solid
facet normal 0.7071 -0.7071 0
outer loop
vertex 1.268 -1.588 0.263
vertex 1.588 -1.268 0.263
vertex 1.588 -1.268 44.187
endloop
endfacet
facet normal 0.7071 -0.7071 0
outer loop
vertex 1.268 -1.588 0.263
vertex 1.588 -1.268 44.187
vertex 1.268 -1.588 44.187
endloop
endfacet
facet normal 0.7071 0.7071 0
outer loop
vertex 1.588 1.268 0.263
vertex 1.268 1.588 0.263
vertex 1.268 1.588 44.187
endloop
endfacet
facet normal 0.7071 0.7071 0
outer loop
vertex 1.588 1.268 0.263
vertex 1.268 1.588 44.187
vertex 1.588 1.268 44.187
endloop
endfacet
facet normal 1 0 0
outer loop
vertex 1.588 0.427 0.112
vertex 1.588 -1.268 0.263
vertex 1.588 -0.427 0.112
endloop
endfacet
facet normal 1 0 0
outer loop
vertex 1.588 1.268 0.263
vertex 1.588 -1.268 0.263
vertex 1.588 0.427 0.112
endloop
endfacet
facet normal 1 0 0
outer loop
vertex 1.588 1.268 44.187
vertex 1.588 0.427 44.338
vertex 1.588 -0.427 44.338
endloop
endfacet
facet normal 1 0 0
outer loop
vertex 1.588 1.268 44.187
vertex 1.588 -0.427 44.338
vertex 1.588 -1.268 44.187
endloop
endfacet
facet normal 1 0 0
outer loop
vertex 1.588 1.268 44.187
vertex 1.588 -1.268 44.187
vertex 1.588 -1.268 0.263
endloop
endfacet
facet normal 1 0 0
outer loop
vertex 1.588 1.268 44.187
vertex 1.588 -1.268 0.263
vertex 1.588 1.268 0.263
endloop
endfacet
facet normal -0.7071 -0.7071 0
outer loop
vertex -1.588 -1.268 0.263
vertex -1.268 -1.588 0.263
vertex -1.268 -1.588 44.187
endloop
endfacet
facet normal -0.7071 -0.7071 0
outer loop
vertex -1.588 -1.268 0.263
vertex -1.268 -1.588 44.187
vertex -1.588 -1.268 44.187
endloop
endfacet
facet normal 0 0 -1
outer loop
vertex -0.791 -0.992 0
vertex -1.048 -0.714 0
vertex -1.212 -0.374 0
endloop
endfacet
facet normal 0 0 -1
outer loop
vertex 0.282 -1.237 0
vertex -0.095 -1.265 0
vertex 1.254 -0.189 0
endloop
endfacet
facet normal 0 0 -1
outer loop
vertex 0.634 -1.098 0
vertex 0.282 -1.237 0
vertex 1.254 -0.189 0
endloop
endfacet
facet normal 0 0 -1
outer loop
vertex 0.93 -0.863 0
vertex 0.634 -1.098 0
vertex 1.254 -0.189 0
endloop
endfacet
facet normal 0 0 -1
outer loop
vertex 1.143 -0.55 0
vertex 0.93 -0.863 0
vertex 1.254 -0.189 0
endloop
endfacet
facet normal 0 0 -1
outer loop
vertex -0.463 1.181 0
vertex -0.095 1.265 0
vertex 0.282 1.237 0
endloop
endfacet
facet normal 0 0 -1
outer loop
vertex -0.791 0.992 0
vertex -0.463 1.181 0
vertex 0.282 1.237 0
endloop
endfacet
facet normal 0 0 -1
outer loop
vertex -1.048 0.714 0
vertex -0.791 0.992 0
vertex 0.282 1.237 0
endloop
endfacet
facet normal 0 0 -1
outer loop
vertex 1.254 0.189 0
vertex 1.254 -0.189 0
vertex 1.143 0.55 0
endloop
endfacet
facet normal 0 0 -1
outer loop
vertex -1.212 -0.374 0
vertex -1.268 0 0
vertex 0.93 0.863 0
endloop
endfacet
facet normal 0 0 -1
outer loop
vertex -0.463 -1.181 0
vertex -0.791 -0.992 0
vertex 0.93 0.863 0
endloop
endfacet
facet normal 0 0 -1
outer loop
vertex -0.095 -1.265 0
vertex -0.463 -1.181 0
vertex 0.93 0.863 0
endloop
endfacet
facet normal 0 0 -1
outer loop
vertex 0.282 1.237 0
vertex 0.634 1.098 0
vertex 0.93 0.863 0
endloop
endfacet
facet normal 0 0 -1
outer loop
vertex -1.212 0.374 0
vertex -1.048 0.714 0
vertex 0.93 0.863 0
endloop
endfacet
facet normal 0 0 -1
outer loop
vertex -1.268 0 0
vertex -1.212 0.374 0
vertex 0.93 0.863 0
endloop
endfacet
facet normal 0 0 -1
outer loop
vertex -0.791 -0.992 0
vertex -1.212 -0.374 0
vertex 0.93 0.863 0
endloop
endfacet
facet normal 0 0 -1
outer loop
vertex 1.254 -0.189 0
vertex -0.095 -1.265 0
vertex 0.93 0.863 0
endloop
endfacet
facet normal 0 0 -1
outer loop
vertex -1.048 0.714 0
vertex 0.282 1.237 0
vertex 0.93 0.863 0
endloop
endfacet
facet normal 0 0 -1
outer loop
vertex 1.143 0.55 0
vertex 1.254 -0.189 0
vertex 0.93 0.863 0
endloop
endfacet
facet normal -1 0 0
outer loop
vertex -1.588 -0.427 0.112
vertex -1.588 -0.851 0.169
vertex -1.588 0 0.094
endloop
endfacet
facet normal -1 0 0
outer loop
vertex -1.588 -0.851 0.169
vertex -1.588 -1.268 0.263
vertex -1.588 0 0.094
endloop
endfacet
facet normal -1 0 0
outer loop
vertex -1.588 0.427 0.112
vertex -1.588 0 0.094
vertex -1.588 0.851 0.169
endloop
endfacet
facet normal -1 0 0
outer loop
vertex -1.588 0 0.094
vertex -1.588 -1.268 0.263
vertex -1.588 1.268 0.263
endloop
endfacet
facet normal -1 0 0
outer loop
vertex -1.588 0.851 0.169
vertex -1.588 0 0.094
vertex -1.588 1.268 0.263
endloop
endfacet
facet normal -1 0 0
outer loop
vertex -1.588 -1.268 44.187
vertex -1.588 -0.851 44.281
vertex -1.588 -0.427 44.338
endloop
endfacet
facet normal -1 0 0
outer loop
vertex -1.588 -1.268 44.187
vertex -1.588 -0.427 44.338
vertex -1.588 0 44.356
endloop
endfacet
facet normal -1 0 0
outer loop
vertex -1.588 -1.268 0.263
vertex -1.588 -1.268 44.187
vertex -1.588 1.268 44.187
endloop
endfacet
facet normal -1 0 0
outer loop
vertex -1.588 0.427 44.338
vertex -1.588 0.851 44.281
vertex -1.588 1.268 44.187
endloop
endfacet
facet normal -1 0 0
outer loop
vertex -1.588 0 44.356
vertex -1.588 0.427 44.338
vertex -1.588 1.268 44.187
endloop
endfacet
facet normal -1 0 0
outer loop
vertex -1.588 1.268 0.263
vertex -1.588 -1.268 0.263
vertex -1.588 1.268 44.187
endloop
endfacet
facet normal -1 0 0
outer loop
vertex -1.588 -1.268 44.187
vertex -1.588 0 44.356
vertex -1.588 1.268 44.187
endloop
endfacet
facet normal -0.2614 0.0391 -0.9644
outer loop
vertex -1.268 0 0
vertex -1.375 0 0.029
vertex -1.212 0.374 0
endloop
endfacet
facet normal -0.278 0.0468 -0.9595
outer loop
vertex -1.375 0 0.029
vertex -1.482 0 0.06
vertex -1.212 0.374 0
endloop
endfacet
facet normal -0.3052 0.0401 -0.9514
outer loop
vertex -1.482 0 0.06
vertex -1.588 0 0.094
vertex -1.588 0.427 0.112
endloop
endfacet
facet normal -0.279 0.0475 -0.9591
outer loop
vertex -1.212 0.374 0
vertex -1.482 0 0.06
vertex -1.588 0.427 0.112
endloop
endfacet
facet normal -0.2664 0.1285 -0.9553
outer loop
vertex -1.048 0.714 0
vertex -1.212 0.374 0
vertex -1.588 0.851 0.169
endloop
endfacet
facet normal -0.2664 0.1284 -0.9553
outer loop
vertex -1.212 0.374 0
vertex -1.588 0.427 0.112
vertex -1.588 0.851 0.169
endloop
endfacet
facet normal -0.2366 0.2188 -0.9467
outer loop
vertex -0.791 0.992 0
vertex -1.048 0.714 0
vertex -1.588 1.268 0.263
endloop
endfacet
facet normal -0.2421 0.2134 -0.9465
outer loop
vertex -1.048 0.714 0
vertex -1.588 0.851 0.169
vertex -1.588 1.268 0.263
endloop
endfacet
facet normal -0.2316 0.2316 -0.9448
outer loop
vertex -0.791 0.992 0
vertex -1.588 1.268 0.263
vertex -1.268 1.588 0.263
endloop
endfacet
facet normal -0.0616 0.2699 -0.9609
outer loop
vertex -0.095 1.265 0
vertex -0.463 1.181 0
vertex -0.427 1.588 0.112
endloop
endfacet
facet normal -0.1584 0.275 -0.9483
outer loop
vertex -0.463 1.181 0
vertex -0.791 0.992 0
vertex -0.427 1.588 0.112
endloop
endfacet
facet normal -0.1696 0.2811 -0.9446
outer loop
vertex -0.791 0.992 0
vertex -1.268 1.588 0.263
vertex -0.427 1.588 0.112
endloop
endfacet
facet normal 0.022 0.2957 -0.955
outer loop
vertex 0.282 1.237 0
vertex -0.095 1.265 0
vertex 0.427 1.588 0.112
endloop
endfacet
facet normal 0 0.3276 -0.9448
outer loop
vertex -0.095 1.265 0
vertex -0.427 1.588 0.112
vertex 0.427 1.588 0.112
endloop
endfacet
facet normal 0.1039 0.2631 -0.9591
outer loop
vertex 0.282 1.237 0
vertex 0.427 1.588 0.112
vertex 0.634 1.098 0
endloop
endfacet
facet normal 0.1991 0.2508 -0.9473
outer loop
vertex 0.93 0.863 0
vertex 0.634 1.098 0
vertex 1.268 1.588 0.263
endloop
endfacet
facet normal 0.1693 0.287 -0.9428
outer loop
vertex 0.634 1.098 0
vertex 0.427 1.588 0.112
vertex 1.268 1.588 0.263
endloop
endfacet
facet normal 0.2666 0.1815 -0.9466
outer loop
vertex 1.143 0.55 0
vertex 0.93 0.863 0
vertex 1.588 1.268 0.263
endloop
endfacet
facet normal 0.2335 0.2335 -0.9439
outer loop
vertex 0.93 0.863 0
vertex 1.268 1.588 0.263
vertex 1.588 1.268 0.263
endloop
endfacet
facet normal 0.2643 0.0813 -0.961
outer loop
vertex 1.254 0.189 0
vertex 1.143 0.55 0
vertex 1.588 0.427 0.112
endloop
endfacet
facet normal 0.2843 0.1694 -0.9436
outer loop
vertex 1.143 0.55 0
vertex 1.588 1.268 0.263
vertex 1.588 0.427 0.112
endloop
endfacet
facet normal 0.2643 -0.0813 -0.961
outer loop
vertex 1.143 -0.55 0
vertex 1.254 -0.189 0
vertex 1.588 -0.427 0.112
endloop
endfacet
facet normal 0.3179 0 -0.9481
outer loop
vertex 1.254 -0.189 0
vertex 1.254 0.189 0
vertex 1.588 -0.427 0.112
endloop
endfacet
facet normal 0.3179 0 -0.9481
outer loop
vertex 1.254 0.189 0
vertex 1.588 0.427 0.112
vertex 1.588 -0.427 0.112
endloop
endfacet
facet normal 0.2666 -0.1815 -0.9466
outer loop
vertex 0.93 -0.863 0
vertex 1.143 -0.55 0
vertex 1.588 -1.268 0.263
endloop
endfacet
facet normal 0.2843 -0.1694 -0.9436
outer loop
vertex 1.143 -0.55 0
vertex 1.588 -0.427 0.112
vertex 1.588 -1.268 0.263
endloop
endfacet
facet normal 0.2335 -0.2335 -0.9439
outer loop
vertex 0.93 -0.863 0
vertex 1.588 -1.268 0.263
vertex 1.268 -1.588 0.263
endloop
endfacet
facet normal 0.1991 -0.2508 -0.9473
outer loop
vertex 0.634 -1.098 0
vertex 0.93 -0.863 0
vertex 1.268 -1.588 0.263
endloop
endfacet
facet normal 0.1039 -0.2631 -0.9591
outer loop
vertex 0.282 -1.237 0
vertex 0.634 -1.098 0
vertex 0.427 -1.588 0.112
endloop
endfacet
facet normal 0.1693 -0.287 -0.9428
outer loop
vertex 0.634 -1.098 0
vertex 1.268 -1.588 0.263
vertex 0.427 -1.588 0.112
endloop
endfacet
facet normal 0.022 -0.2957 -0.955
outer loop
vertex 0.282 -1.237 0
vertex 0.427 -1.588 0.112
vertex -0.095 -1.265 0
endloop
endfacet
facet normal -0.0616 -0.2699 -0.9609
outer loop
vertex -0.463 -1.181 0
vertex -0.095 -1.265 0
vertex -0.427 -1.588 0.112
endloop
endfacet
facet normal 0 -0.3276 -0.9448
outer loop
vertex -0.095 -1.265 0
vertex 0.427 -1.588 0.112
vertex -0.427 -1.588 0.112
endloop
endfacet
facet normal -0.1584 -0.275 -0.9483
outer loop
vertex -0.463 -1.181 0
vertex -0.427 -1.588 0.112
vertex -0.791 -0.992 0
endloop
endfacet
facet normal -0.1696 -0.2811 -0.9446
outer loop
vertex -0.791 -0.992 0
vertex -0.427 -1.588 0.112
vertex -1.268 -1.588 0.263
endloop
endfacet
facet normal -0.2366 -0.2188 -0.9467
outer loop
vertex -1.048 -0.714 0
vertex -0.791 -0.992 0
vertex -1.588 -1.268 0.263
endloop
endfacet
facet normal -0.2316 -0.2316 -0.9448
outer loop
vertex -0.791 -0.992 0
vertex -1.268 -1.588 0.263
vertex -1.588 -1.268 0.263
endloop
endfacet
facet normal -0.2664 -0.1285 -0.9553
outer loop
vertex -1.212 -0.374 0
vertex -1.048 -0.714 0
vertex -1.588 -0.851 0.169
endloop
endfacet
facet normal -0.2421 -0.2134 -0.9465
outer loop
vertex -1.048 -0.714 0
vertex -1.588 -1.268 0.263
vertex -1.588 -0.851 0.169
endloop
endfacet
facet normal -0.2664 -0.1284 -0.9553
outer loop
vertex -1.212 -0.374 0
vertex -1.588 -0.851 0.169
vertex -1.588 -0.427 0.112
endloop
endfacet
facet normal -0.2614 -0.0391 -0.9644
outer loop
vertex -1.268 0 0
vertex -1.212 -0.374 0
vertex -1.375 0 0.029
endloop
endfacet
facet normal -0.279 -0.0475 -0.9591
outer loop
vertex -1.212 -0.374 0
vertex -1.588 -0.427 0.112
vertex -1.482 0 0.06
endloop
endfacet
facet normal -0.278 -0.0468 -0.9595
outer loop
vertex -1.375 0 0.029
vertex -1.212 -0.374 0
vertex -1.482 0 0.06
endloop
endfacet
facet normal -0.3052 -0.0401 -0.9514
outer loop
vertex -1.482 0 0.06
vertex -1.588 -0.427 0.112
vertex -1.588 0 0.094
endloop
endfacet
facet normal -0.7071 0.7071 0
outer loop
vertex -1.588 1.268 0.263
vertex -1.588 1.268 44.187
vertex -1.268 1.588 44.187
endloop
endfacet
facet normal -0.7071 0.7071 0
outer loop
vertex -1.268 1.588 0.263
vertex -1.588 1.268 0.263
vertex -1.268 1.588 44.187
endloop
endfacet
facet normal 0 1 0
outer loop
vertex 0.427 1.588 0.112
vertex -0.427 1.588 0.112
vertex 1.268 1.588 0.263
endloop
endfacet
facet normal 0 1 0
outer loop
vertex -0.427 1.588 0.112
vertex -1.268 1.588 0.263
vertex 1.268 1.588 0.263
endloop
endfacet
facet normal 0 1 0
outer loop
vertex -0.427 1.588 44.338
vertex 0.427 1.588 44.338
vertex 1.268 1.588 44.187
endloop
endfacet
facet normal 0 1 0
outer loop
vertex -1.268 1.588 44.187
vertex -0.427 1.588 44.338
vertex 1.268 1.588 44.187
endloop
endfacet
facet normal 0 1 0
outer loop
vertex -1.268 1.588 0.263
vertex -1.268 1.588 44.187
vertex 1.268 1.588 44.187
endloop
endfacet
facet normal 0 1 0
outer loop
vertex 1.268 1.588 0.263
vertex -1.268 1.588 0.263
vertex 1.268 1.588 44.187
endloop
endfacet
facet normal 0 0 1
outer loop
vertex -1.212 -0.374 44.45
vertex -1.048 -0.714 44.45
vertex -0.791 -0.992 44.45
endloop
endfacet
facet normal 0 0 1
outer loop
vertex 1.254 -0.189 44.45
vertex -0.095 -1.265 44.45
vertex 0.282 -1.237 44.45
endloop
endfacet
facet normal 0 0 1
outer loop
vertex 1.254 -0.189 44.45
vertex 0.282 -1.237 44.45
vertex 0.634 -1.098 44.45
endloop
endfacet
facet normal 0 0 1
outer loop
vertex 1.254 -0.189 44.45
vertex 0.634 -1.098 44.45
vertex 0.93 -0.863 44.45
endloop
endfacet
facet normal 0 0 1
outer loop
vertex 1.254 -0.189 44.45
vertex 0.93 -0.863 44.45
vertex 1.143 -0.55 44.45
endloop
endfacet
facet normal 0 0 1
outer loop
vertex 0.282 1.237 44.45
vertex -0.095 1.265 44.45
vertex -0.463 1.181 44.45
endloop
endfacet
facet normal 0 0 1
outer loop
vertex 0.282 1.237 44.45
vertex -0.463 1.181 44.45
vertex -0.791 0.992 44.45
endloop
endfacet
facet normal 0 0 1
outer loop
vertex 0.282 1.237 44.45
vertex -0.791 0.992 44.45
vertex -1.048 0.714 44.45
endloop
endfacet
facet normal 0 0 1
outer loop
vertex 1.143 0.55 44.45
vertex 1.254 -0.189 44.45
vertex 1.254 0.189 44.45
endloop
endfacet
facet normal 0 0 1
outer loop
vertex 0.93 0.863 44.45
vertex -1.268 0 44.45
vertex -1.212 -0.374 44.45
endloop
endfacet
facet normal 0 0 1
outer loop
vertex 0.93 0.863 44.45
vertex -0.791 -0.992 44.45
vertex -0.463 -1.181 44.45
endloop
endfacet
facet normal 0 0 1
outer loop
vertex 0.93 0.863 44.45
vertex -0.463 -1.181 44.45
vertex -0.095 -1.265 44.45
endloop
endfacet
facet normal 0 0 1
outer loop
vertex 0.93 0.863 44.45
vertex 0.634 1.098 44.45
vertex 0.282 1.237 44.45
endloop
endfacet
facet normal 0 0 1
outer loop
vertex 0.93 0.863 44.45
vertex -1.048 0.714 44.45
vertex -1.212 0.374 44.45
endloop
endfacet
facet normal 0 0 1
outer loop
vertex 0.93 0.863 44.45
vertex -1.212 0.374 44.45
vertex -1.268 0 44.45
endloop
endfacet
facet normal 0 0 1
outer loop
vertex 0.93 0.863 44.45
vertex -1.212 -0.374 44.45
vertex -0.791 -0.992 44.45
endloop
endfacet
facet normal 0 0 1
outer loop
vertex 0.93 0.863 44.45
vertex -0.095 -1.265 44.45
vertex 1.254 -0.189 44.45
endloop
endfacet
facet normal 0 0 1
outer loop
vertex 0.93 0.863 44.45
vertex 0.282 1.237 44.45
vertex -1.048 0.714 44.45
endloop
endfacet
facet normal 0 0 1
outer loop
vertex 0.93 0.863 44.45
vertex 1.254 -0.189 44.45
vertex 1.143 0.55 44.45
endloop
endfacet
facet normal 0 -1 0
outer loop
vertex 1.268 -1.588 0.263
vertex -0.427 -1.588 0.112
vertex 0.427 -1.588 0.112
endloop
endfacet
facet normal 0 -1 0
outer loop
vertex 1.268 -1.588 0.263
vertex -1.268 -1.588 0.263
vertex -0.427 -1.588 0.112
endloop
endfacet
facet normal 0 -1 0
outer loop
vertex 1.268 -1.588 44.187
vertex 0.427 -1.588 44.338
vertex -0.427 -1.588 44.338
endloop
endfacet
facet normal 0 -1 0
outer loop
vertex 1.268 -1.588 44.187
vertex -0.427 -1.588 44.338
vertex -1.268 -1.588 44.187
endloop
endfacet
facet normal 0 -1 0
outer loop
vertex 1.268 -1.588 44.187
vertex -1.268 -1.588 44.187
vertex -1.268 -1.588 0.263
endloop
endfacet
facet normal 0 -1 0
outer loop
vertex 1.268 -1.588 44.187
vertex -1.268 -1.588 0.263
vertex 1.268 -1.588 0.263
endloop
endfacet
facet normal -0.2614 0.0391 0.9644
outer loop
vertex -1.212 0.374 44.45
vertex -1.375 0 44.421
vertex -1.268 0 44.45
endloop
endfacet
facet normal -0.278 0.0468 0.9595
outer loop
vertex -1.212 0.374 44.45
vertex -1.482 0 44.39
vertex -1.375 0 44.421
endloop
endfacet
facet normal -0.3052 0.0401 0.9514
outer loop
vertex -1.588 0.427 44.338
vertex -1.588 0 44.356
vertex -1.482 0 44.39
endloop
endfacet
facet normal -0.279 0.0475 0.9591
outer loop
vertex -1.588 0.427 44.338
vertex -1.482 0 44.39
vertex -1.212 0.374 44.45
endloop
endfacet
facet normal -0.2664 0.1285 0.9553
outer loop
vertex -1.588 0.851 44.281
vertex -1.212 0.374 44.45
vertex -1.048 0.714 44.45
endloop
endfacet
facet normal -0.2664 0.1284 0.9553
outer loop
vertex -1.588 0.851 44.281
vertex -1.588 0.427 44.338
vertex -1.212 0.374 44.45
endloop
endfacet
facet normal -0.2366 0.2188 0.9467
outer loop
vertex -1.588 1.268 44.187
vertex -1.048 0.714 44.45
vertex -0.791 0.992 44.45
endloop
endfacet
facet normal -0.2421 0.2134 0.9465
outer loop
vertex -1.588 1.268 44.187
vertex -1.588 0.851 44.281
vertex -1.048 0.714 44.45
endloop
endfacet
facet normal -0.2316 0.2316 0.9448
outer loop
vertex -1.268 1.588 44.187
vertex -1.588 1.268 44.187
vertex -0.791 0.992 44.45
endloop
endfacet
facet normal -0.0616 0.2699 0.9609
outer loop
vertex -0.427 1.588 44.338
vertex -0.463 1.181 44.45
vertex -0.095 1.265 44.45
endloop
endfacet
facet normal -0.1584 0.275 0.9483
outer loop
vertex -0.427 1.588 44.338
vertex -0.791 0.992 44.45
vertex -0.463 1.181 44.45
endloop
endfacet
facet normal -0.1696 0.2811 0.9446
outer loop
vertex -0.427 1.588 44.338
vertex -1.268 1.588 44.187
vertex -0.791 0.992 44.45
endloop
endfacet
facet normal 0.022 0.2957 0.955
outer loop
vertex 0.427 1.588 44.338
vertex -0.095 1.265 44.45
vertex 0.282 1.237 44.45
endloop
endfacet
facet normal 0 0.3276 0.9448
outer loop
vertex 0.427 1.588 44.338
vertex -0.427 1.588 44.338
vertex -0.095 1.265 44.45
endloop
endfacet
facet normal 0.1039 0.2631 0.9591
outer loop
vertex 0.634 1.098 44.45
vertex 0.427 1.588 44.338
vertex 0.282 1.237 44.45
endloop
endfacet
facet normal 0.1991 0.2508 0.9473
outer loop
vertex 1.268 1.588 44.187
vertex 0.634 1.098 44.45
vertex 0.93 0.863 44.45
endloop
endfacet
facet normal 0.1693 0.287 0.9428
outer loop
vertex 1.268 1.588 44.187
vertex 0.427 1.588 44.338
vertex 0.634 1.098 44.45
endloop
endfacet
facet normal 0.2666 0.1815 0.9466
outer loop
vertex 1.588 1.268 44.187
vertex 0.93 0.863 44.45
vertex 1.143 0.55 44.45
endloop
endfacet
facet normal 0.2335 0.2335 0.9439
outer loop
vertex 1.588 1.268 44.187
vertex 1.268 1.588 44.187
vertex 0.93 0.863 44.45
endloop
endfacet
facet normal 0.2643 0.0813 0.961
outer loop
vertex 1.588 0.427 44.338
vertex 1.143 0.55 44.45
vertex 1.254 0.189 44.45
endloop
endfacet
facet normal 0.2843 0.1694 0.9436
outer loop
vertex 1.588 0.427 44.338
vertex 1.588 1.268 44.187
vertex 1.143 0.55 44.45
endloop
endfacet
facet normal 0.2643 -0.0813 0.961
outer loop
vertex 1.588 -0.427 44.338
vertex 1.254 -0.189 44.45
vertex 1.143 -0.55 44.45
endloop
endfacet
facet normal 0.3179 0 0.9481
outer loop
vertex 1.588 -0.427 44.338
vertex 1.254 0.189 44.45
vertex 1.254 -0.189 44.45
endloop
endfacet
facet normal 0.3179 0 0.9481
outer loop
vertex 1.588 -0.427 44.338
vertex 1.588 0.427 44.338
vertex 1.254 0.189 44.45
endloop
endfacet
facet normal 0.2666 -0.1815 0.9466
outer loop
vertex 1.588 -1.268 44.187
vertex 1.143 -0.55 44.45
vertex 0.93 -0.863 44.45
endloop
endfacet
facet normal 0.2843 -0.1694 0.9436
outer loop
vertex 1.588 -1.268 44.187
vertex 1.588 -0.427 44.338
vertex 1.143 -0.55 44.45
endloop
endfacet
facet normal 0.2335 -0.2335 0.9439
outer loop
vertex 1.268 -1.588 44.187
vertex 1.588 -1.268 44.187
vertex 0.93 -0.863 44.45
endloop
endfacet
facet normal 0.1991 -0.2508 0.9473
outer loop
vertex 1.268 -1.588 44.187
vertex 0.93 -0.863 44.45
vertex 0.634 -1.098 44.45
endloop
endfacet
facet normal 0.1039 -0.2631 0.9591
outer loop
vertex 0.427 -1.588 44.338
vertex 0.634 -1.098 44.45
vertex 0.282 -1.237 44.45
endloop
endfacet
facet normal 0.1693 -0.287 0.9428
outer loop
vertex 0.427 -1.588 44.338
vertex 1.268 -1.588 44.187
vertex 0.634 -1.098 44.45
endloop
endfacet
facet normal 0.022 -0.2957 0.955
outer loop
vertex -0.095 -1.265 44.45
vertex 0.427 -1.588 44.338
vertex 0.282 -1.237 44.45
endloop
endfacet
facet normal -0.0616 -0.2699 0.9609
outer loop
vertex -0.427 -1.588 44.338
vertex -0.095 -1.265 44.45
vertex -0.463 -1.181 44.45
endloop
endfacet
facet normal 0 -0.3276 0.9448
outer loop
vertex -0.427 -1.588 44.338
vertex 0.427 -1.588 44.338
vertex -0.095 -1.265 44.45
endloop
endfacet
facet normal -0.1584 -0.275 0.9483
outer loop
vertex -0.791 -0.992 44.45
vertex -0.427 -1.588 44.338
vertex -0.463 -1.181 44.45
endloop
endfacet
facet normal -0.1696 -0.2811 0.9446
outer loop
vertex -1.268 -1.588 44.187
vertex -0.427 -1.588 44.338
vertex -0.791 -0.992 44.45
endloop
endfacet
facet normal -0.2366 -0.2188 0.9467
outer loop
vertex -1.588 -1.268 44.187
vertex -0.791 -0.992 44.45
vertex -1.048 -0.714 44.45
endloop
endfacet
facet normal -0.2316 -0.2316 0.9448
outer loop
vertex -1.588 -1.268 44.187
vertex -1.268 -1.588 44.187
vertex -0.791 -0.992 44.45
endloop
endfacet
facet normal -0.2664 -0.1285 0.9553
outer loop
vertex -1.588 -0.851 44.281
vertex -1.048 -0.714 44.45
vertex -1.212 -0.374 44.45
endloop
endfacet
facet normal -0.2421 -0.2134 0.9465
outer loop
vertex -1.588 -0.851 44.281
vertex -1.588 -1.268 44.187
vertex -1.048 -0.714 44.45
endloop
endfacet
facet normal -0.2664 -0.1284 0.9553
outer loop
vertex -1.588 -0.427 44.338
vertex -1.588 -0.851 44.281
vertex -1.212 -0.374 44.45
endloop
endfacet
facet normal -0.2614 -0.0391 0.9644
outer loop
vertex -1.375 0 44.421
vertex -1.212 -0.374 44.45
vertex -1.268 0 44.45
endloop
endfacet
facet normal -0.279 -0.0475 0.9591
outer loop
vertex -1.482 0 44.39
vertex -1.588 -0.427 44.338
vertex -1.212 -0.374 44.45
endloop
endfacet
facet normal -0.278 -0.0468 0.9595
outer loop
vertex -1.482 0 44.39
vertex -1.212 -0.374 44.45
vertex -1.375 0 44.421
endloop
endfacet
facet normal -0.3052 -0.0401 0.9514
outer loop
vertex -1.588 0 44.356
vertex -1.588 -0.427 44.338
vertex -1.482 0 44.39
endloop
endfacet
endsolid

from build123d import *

# Parameters (mm, degrees)
SKETCH1_W           = 3.175
SKETCH1_H           = 3.175
BOSS_EXTRUDE1_DEPTH = 22.225
SKETCH2_OUTSIDE_W   = 9.708
SKETCH2_OUTSIDE_H   = 9.708
SKETCH2_OUTSIDE_R   = 2.032
CUT_EXTRUDE1_DEPTH  = 23.338105056


with BuildPart() as part:
    # Sketch1 → Boss-Extrude1 (new body)
    with BuildSketch(Plane.XY):
        Rectangle(SKETCH1_W, SKETCH1_H)
    extrude(amount=BOSS_EXTRUDE1_DEPTH)

    # Sketch2 outside → Cut-Extrude1 (cut, through all)
    with BuildSketch(Plane(origin=(0, 0, 0), x_dir=(-1, 0, 0), z_dir=(0, 0, -1))):
        Rectangle(SKETCH2_OUTSIDE_W, SKETCH2_OUTSIDE_H)
        Circle(SKETCH2_OUTSIDE_R, mode=Mode.SUBTRACT)
    extrude(amount=-CUT_EXTRUDE1_DEPTH, mode=Mode.SUBTRACT)

    # Sketch3 → Cut-Revolve1 (revolve, cut)
    with BuildSketch(Plane(origin=(0, 0, 0), x_dir=(1, 0, 0), z_dir=(0, 1, 0))):
        with BuildLine():
            Line((-5.053685963, -4.40273269), (-5.053685963, 5.740530545))
            Line((-5.053685963, 5.740530545), (0, 5.740530545))
            Line((0, 5.740530545), (0, 0.160877736))
            ThreePointArc((0, 0.160877736), (-3.404639553, -1.148866368), (-5.053685963, -4.40273269))
        make_face()
    revolve(axis=Axis((0, 0, 22.225), (0, 0, -1)), mode=Mode.SUBTRACT)

    # Mirror1: part across plane


with BuildPart() as part_1:
    add(part.part)
    add(part.part.mirror(Plane(origin=(0, 0, 22.225), x_dir=(1, 0, 0), z_dir=(0, 0, -1))))


solid = part_1.part
